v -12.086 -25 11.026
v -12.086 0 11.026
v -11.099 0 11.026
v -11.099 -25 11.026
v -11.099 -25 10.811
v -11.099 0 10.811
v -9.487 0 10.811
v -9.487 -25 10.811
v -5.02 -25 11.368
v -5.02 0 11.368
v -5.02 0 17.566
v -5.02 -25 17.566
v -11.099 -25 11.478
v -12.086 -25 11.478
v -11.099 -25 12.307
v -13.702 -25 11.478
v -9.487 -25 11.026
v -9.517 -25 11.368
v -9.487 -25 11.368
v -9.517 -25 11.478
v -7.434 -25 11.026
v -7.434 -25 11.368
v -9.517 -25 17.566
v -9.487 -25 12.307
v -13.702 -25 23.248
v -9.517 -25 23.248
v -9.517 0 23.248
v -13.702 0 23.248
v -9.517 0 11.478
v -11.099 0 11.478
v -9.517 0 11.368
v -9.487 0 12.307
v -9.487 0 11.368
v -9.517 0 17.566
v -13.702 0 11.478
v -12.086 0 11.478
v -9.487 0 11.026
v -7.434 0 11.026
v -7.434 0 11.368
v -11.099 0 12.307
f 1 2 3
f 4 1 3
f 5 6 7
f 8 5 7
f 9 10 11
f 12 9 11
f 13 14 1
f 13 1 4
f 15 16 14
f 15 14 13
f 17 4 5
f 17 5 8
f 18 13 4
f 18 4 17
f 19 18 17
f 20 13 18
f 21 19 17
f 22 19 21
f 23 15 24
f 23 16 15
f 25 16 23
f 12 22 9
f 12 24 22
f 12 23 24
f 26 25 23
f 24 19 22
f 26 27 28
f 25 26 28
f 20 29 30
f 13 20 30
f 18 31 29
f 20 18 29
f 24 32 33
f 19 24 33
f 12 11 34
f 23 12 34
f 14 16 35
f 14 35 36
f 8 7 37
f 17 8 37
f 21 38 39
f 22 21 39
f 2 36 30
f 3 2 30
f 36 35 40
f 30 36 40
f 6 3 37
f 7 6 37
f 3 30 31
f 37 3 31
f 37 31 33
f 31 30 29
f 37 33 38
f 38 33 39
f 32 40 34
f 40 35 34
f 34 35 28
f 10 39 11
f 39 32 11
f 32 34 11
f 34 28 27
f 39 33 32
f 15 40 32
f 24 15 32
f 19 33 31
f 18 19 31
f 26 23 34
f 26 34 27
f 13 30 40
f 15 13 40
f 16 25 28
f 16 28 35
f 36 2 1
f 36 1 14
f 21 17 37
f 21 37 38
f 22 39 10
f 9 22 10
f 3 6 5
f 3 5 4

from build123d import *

# Parameters (mm, degrees)
F0_W     = 0.9875223041
F0_H     = 0.4511103034
F0_W_2   = 1.6117542982
F0_H_2   = 0.2151634544
F0_W_3   = 2.0527206361
F0_H_3   = 0.3410726786
F1_DEPTH = 25


with BuildPart() as f1:
    # F0 (on Front) → F1 (new body)
    with BuildSketch(Plane.XZ):
        Polygon((-5.0200670958, 17.5655037165), (-9.5167346299, 17.5655037165), (-9.5167346299, 15.2649758384), (-7.4343085289, 15.2649758384), (-7.4343085289, 11.3675463945), (-5.0200670958, 11.3675463945), align=None)
        Polygon((-9.5167346299, 23.2478547841), (-13.7016326189, 23.2478547841), (-13.7016326189, 11.4775840193), (-12.0863057673, 11.4775840193), (-12.0863057673, 15.2649758384), (-9.5167346299, 15.2649758384), (-9.5167346299, 17.5655037165), align=None)
        Polygon((-12.0863057673, 15.2649758384), (-12.0863057673, 11.4775840193), (-11.0987834632, 11.4775840193), (-11.0987834632, 12.3073123395), (-9.5167346299, 12.3073123395), (-9.5167346299, 15.2649758384), align=None)
        with Locations((-11.5925446153, 11.2520288676)):
            Rectangle(F0_W, F0_H)
        Polygon((-7.4343085289, 15.2649758384), (-9.5167346299, 15.2649758384), (-9.5167346299, 12.3073123395), (-9.487029165, 12.3073123395), (-9.487029165, 11.3675463945), (-7.4343085289, 11.3675463945), align=None)
        Polygon((-9.5167346299, 11.4775840193), (-11.0987834632, 11.4775840193), (-11.0987834632, 11.0264737159), (-9.487029165, 11.0264737159), (-9.487029165, 11.3675463945), (-9.5167346299, 11.3675463945), align=None)
        with Locations((-10.2929063141, 10.9188919887)):
            Rectangle(F0_W_2, F0_H_2)
        with Locations((-8.460668847, 11.1970100552)):
            Rectangle(F0_W_3, F0_H_3)
    extrude(amount=F1_DEPTH)


solid = f1.part
